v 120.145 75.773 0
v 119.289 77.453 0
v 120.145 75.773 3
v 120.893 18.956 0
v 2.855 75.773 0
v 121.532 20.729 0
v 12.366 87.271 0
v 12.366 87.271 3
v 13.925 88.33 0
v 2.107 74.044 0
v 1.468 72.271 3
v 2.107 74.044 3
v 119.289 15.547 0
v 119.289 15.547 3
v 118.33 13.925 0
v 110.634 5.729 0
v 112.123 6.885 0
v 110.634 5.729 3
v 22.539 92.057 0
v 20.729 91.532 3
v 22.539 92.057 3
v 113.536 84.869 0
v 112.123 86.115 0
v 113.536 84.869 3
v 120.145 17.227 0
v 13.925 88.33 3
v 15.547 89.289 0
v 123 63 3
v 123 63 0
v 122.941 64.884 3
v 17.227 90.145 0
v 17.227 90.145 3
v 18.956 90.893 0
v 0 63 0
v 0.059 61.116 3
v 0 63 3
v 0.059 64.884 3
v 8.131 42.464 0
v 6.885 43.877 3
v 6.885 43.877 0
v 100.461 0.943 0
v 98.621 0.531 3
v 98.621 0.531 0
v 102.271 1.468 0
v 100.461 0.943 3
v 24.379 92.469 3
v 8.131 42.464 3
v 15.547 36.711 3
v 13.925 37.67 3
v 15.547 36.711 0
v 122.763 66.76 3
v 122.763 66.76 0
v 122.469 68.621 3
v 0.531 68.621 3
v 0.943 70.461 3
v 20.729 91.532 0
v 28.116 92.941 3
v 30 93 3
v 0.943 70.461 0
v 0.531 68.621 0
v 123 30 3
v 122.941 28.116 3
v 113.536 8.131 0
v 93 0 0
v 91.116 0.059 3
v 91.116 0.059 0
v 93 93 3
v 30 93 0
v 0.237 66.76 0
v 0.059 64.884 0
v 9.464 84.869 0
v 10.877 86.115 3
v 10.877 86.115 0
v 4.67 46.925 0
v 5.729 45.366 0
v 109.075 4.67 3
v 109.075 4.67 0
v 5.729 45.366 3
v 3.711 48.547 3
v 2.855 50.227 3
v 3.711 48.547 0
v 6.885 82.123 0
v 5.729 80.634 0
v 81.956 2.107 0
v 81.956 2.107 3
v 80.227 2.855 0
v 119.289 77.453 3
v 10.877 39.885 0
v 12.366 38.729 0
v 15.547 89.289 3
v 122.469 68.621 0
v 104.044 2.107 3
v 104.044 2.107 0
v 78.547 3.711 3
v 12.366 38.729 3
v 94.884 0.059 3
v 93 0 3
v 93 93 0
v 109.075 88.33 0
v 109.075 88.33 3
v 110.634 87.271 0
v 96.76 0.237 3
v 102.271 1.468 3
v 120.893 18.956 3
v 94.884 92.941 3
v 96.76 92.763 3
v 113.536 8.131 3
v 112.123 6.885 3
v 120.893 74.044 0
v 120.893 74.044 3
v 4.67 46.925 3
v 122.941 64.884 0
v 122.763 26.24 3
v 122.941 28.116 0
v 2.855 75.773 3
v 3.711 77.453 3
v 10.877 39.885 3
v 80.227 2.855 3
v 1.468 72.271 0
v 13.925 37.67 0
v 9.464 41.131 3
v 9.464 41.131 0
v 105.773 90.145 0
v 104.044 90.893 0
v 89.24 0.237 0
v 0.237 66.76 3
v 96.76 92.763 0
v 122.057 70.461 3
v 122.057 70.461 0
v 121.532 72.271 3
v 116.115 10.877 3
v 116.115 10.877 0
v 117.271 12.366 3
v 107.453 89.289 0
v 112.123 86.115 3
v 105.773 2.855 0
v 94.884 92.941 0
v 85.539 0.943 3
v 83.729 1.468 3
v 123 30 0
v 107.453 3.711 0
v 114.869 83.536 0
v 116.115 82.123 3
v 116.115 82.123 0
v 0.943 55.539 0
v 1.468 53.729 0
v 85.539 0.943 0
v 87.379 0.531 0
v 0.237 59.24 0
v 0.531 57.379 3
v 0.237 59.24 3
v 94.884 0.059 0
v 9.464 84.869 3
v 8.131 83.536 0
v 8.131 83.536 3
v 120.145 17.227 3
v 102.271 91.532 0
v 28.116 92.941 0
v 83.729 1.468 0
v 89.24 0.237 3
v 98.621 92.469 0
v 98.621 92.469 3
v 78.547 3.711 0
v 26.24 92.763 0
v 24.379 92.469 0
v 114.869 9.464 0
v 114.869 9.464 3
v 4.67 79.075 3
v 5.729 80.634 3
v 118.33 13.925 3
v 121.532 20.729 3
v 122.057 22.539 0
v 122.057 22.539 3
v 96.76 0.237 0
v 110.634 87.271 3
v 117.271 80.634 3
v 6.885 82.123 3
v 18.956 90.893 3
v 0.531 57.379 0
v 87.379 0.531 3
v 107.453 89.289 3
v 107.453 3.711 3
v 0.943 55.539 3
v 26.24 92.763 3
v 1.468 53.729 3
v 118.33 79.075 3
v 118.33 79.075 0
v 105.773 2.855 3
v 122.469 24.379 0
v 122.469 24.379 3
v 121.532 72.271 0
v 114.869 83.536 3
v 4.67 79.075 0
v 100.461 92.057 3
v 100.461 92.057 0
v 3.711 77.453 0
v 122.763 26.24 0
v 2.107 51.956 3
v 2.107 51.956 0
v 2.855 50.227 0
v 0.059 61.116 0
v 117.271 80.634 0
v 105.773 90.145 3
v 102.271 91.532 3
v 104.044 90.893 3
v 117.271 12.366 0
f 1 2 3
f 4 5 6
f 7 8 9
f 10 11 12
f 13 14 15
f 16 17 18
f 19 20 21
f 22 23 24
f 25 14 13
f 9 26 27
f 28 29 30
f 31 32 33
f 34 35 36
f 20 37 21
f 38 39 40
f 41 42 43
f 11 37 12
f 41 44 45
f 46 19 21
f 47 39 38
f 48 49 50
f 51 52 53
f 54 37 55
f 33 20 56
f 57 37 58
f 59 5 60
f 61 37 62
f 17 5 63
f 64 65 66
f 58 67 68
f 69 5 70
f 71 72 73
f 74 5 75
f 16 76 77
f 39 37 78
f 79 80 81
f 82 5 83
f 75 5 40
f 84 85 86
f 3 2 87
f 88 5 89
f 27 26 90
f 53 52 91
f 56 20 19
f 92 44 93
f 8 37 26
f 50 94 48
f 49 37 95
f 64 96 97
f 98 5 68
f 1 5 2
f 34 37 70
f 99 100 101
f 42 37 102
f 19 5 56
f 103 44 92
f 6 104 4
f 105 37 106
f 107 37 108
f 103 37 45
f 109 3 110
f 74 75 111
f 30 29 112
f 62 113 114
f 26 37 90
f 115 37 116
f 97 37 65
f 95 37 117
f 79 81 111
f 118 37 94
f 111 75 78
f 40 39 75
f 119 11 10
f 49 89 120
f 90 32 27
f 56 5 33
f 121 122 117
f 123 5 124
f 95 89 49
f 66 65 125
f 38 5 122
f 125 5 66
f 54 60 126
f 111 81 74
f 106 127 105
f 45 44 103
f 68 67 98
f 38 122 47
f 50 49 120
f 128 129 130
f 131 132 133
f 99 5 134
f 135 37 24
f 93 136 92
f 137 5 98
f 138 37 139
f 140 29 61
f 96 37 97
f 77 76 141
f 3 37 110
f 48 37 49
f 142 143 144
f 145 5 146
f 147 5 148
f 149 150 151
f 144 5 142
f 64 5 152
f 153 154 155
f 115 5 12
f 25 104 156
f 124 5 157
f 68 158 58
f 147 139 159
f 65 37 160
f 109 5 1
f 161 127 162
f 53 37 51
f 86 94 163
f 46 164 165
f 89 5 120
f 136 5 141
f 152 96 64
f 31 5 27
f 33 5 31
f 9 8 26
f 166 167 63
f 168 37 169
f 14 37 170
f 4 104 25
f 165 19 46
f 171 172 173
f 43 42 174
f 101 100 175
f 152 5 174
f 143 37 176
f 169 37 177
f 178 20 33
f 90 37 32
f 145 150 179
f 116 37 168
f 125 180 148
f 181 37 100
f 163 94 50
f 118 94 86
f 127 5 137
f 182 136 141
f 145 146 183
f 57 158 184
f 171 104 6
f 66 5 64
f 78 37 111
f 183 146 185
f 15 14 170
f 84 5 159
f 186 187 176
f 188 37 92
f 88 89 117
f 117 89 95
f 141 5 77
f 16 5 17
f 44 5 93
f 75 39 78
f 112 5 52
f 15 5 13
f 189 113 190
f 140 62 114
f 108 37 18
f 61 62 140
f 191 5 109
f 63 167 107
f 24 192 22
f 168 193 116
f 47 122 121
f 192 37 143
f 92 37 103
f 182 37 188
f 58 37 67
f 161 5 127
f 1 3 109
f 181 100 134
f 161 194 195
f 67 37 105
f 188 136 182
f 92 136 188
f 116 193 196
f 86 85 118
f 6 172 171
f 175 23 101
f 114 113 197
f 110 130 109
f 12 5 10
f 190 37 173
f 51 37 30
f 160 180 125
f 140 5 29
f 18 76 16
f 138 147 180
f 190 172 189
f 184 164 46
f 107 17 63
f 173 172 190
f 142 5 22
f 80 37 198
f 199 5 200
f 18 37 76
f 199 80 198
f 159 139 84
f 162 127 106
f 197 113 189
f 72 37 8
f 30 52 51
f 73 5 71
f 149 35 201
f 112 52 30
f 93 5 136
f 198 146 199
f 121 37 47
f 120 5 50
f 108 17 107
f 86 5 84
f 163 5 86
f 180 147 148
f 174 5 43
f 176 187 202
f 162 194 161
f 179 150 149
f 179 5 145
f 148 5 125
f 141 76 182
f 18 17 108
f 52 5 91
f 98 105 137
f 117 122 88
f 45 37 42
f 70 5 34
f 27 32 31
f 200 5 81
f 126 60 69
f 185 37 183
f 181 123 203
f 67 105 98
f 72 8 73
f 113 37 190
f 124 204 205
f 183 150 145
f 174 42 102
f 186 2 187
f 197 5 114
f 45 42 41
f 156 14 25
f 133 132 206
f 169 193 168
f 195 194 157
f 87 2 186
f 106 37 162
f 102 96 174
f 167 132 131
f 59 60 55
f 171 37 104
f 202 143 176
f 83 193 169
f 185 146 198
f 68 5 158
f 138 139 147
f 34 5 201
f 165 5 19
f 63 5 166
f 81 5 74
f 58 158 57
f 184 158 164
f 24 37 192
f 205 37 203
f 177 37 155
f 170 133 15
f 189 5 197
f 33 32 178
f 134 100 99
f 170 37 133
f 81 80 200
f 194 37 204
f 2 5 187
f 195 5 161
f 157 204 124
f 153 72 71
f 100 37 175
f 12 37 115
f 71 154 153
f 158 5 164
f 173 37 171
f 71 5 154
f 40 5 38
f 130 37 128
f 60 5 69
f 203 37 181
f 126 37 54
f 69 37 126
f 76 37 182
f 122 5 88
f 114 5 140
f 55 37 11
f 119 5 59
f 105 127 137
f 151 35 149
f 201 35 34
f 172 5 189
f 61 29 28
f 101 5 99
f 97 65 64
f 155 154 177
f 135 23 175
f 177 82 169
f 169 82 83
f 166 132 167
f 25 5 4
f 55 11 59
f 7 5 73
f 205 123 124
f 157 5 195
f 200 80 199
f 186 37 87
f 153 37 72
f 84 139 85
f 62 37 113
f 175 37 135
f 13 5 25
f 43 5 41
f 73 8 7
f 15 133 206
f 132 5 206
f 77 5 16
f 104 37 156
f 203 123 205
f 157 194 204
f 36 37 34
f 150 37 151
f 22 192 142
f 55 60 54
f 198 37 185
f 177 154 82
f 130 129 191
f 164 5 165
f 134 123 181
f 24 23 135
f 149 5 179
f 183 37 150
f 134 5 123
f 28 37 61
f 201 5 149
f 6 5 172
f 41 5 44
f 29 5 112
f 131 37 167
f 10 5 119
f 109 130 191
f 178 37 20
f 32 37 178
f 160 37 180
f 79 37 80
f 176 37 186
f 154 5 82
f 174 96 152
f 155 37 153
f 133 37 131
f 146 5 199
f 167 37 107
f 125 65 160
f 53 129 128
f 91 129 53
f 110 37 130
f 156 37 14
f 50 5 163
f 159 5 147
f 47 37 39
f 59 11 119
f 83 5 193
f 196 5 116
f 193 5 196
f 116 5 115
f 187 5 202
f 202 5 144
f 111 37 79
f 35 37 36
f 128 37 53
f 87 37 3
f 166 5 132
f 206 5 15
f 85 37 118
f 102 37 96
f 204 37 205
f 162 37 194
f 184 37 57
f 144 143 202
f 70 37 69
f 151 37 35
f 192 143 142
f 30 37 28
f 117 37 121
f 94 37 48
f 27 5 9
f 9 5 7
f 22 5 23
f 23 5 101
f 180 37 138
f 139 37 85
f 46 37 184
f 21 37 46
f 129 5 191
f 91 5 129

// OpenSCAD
/*
        ENAMEL PROJECT - MELANIE BALJKO
        MODELLING FOR VERSION 3
        SHWETA DIXIT - 2017
        
        TITLE --- SLIDER TOP LID
        
        (Measurements in mm)
        
        
*/

$fn = 100;

////////////////// Variables ////////////////////////////

/// For Outer Cube
x_dim = 130;
y_dim = 100;
z_dim = 80;
r_dim = 30;

/// For Inner cube
x_in = x_dim - 10;
y_in = y_dim - 10;
z_in = z_dim +5;
r_in = r_dim;

/// For slider lid
x_lid = x_in + 3;
y_lid = y_in + 3;
z_lid = 3;
r_lid = r_in;
    
    
/////////////// BUILDING MODEL //////////////////

// Making the slider lid
module slider_lid(x_lid, y_lid, z_lid, r_lid)
hull(){
    translate([r_lid, r_lid, 0])
    {
        intersection()
        {
            cylinder(r = r_lid, h = z_lid);
            cube([r_lid*2, (r_lid), (z_lid)]);
            
        }
    }
    
    translate([x_lid- r_lid, r_lid, 0])
    {
        cylinder(r = r_lid, h = z_lid);
    }
    
    translate([r_lid, y_lid - r_lid, 0])
    {
        cylinder(r = r_lid, h = z_lid);
    }
    
    translate([x_lid - r_lid, y_lid - r_lid, 0])
    {
        cylinder(r = r_lid, h = z_lid);
    }
}
slider_lid(x_lid, y_lid, z_lid, r_lid);

// Adding the bottom closing area
